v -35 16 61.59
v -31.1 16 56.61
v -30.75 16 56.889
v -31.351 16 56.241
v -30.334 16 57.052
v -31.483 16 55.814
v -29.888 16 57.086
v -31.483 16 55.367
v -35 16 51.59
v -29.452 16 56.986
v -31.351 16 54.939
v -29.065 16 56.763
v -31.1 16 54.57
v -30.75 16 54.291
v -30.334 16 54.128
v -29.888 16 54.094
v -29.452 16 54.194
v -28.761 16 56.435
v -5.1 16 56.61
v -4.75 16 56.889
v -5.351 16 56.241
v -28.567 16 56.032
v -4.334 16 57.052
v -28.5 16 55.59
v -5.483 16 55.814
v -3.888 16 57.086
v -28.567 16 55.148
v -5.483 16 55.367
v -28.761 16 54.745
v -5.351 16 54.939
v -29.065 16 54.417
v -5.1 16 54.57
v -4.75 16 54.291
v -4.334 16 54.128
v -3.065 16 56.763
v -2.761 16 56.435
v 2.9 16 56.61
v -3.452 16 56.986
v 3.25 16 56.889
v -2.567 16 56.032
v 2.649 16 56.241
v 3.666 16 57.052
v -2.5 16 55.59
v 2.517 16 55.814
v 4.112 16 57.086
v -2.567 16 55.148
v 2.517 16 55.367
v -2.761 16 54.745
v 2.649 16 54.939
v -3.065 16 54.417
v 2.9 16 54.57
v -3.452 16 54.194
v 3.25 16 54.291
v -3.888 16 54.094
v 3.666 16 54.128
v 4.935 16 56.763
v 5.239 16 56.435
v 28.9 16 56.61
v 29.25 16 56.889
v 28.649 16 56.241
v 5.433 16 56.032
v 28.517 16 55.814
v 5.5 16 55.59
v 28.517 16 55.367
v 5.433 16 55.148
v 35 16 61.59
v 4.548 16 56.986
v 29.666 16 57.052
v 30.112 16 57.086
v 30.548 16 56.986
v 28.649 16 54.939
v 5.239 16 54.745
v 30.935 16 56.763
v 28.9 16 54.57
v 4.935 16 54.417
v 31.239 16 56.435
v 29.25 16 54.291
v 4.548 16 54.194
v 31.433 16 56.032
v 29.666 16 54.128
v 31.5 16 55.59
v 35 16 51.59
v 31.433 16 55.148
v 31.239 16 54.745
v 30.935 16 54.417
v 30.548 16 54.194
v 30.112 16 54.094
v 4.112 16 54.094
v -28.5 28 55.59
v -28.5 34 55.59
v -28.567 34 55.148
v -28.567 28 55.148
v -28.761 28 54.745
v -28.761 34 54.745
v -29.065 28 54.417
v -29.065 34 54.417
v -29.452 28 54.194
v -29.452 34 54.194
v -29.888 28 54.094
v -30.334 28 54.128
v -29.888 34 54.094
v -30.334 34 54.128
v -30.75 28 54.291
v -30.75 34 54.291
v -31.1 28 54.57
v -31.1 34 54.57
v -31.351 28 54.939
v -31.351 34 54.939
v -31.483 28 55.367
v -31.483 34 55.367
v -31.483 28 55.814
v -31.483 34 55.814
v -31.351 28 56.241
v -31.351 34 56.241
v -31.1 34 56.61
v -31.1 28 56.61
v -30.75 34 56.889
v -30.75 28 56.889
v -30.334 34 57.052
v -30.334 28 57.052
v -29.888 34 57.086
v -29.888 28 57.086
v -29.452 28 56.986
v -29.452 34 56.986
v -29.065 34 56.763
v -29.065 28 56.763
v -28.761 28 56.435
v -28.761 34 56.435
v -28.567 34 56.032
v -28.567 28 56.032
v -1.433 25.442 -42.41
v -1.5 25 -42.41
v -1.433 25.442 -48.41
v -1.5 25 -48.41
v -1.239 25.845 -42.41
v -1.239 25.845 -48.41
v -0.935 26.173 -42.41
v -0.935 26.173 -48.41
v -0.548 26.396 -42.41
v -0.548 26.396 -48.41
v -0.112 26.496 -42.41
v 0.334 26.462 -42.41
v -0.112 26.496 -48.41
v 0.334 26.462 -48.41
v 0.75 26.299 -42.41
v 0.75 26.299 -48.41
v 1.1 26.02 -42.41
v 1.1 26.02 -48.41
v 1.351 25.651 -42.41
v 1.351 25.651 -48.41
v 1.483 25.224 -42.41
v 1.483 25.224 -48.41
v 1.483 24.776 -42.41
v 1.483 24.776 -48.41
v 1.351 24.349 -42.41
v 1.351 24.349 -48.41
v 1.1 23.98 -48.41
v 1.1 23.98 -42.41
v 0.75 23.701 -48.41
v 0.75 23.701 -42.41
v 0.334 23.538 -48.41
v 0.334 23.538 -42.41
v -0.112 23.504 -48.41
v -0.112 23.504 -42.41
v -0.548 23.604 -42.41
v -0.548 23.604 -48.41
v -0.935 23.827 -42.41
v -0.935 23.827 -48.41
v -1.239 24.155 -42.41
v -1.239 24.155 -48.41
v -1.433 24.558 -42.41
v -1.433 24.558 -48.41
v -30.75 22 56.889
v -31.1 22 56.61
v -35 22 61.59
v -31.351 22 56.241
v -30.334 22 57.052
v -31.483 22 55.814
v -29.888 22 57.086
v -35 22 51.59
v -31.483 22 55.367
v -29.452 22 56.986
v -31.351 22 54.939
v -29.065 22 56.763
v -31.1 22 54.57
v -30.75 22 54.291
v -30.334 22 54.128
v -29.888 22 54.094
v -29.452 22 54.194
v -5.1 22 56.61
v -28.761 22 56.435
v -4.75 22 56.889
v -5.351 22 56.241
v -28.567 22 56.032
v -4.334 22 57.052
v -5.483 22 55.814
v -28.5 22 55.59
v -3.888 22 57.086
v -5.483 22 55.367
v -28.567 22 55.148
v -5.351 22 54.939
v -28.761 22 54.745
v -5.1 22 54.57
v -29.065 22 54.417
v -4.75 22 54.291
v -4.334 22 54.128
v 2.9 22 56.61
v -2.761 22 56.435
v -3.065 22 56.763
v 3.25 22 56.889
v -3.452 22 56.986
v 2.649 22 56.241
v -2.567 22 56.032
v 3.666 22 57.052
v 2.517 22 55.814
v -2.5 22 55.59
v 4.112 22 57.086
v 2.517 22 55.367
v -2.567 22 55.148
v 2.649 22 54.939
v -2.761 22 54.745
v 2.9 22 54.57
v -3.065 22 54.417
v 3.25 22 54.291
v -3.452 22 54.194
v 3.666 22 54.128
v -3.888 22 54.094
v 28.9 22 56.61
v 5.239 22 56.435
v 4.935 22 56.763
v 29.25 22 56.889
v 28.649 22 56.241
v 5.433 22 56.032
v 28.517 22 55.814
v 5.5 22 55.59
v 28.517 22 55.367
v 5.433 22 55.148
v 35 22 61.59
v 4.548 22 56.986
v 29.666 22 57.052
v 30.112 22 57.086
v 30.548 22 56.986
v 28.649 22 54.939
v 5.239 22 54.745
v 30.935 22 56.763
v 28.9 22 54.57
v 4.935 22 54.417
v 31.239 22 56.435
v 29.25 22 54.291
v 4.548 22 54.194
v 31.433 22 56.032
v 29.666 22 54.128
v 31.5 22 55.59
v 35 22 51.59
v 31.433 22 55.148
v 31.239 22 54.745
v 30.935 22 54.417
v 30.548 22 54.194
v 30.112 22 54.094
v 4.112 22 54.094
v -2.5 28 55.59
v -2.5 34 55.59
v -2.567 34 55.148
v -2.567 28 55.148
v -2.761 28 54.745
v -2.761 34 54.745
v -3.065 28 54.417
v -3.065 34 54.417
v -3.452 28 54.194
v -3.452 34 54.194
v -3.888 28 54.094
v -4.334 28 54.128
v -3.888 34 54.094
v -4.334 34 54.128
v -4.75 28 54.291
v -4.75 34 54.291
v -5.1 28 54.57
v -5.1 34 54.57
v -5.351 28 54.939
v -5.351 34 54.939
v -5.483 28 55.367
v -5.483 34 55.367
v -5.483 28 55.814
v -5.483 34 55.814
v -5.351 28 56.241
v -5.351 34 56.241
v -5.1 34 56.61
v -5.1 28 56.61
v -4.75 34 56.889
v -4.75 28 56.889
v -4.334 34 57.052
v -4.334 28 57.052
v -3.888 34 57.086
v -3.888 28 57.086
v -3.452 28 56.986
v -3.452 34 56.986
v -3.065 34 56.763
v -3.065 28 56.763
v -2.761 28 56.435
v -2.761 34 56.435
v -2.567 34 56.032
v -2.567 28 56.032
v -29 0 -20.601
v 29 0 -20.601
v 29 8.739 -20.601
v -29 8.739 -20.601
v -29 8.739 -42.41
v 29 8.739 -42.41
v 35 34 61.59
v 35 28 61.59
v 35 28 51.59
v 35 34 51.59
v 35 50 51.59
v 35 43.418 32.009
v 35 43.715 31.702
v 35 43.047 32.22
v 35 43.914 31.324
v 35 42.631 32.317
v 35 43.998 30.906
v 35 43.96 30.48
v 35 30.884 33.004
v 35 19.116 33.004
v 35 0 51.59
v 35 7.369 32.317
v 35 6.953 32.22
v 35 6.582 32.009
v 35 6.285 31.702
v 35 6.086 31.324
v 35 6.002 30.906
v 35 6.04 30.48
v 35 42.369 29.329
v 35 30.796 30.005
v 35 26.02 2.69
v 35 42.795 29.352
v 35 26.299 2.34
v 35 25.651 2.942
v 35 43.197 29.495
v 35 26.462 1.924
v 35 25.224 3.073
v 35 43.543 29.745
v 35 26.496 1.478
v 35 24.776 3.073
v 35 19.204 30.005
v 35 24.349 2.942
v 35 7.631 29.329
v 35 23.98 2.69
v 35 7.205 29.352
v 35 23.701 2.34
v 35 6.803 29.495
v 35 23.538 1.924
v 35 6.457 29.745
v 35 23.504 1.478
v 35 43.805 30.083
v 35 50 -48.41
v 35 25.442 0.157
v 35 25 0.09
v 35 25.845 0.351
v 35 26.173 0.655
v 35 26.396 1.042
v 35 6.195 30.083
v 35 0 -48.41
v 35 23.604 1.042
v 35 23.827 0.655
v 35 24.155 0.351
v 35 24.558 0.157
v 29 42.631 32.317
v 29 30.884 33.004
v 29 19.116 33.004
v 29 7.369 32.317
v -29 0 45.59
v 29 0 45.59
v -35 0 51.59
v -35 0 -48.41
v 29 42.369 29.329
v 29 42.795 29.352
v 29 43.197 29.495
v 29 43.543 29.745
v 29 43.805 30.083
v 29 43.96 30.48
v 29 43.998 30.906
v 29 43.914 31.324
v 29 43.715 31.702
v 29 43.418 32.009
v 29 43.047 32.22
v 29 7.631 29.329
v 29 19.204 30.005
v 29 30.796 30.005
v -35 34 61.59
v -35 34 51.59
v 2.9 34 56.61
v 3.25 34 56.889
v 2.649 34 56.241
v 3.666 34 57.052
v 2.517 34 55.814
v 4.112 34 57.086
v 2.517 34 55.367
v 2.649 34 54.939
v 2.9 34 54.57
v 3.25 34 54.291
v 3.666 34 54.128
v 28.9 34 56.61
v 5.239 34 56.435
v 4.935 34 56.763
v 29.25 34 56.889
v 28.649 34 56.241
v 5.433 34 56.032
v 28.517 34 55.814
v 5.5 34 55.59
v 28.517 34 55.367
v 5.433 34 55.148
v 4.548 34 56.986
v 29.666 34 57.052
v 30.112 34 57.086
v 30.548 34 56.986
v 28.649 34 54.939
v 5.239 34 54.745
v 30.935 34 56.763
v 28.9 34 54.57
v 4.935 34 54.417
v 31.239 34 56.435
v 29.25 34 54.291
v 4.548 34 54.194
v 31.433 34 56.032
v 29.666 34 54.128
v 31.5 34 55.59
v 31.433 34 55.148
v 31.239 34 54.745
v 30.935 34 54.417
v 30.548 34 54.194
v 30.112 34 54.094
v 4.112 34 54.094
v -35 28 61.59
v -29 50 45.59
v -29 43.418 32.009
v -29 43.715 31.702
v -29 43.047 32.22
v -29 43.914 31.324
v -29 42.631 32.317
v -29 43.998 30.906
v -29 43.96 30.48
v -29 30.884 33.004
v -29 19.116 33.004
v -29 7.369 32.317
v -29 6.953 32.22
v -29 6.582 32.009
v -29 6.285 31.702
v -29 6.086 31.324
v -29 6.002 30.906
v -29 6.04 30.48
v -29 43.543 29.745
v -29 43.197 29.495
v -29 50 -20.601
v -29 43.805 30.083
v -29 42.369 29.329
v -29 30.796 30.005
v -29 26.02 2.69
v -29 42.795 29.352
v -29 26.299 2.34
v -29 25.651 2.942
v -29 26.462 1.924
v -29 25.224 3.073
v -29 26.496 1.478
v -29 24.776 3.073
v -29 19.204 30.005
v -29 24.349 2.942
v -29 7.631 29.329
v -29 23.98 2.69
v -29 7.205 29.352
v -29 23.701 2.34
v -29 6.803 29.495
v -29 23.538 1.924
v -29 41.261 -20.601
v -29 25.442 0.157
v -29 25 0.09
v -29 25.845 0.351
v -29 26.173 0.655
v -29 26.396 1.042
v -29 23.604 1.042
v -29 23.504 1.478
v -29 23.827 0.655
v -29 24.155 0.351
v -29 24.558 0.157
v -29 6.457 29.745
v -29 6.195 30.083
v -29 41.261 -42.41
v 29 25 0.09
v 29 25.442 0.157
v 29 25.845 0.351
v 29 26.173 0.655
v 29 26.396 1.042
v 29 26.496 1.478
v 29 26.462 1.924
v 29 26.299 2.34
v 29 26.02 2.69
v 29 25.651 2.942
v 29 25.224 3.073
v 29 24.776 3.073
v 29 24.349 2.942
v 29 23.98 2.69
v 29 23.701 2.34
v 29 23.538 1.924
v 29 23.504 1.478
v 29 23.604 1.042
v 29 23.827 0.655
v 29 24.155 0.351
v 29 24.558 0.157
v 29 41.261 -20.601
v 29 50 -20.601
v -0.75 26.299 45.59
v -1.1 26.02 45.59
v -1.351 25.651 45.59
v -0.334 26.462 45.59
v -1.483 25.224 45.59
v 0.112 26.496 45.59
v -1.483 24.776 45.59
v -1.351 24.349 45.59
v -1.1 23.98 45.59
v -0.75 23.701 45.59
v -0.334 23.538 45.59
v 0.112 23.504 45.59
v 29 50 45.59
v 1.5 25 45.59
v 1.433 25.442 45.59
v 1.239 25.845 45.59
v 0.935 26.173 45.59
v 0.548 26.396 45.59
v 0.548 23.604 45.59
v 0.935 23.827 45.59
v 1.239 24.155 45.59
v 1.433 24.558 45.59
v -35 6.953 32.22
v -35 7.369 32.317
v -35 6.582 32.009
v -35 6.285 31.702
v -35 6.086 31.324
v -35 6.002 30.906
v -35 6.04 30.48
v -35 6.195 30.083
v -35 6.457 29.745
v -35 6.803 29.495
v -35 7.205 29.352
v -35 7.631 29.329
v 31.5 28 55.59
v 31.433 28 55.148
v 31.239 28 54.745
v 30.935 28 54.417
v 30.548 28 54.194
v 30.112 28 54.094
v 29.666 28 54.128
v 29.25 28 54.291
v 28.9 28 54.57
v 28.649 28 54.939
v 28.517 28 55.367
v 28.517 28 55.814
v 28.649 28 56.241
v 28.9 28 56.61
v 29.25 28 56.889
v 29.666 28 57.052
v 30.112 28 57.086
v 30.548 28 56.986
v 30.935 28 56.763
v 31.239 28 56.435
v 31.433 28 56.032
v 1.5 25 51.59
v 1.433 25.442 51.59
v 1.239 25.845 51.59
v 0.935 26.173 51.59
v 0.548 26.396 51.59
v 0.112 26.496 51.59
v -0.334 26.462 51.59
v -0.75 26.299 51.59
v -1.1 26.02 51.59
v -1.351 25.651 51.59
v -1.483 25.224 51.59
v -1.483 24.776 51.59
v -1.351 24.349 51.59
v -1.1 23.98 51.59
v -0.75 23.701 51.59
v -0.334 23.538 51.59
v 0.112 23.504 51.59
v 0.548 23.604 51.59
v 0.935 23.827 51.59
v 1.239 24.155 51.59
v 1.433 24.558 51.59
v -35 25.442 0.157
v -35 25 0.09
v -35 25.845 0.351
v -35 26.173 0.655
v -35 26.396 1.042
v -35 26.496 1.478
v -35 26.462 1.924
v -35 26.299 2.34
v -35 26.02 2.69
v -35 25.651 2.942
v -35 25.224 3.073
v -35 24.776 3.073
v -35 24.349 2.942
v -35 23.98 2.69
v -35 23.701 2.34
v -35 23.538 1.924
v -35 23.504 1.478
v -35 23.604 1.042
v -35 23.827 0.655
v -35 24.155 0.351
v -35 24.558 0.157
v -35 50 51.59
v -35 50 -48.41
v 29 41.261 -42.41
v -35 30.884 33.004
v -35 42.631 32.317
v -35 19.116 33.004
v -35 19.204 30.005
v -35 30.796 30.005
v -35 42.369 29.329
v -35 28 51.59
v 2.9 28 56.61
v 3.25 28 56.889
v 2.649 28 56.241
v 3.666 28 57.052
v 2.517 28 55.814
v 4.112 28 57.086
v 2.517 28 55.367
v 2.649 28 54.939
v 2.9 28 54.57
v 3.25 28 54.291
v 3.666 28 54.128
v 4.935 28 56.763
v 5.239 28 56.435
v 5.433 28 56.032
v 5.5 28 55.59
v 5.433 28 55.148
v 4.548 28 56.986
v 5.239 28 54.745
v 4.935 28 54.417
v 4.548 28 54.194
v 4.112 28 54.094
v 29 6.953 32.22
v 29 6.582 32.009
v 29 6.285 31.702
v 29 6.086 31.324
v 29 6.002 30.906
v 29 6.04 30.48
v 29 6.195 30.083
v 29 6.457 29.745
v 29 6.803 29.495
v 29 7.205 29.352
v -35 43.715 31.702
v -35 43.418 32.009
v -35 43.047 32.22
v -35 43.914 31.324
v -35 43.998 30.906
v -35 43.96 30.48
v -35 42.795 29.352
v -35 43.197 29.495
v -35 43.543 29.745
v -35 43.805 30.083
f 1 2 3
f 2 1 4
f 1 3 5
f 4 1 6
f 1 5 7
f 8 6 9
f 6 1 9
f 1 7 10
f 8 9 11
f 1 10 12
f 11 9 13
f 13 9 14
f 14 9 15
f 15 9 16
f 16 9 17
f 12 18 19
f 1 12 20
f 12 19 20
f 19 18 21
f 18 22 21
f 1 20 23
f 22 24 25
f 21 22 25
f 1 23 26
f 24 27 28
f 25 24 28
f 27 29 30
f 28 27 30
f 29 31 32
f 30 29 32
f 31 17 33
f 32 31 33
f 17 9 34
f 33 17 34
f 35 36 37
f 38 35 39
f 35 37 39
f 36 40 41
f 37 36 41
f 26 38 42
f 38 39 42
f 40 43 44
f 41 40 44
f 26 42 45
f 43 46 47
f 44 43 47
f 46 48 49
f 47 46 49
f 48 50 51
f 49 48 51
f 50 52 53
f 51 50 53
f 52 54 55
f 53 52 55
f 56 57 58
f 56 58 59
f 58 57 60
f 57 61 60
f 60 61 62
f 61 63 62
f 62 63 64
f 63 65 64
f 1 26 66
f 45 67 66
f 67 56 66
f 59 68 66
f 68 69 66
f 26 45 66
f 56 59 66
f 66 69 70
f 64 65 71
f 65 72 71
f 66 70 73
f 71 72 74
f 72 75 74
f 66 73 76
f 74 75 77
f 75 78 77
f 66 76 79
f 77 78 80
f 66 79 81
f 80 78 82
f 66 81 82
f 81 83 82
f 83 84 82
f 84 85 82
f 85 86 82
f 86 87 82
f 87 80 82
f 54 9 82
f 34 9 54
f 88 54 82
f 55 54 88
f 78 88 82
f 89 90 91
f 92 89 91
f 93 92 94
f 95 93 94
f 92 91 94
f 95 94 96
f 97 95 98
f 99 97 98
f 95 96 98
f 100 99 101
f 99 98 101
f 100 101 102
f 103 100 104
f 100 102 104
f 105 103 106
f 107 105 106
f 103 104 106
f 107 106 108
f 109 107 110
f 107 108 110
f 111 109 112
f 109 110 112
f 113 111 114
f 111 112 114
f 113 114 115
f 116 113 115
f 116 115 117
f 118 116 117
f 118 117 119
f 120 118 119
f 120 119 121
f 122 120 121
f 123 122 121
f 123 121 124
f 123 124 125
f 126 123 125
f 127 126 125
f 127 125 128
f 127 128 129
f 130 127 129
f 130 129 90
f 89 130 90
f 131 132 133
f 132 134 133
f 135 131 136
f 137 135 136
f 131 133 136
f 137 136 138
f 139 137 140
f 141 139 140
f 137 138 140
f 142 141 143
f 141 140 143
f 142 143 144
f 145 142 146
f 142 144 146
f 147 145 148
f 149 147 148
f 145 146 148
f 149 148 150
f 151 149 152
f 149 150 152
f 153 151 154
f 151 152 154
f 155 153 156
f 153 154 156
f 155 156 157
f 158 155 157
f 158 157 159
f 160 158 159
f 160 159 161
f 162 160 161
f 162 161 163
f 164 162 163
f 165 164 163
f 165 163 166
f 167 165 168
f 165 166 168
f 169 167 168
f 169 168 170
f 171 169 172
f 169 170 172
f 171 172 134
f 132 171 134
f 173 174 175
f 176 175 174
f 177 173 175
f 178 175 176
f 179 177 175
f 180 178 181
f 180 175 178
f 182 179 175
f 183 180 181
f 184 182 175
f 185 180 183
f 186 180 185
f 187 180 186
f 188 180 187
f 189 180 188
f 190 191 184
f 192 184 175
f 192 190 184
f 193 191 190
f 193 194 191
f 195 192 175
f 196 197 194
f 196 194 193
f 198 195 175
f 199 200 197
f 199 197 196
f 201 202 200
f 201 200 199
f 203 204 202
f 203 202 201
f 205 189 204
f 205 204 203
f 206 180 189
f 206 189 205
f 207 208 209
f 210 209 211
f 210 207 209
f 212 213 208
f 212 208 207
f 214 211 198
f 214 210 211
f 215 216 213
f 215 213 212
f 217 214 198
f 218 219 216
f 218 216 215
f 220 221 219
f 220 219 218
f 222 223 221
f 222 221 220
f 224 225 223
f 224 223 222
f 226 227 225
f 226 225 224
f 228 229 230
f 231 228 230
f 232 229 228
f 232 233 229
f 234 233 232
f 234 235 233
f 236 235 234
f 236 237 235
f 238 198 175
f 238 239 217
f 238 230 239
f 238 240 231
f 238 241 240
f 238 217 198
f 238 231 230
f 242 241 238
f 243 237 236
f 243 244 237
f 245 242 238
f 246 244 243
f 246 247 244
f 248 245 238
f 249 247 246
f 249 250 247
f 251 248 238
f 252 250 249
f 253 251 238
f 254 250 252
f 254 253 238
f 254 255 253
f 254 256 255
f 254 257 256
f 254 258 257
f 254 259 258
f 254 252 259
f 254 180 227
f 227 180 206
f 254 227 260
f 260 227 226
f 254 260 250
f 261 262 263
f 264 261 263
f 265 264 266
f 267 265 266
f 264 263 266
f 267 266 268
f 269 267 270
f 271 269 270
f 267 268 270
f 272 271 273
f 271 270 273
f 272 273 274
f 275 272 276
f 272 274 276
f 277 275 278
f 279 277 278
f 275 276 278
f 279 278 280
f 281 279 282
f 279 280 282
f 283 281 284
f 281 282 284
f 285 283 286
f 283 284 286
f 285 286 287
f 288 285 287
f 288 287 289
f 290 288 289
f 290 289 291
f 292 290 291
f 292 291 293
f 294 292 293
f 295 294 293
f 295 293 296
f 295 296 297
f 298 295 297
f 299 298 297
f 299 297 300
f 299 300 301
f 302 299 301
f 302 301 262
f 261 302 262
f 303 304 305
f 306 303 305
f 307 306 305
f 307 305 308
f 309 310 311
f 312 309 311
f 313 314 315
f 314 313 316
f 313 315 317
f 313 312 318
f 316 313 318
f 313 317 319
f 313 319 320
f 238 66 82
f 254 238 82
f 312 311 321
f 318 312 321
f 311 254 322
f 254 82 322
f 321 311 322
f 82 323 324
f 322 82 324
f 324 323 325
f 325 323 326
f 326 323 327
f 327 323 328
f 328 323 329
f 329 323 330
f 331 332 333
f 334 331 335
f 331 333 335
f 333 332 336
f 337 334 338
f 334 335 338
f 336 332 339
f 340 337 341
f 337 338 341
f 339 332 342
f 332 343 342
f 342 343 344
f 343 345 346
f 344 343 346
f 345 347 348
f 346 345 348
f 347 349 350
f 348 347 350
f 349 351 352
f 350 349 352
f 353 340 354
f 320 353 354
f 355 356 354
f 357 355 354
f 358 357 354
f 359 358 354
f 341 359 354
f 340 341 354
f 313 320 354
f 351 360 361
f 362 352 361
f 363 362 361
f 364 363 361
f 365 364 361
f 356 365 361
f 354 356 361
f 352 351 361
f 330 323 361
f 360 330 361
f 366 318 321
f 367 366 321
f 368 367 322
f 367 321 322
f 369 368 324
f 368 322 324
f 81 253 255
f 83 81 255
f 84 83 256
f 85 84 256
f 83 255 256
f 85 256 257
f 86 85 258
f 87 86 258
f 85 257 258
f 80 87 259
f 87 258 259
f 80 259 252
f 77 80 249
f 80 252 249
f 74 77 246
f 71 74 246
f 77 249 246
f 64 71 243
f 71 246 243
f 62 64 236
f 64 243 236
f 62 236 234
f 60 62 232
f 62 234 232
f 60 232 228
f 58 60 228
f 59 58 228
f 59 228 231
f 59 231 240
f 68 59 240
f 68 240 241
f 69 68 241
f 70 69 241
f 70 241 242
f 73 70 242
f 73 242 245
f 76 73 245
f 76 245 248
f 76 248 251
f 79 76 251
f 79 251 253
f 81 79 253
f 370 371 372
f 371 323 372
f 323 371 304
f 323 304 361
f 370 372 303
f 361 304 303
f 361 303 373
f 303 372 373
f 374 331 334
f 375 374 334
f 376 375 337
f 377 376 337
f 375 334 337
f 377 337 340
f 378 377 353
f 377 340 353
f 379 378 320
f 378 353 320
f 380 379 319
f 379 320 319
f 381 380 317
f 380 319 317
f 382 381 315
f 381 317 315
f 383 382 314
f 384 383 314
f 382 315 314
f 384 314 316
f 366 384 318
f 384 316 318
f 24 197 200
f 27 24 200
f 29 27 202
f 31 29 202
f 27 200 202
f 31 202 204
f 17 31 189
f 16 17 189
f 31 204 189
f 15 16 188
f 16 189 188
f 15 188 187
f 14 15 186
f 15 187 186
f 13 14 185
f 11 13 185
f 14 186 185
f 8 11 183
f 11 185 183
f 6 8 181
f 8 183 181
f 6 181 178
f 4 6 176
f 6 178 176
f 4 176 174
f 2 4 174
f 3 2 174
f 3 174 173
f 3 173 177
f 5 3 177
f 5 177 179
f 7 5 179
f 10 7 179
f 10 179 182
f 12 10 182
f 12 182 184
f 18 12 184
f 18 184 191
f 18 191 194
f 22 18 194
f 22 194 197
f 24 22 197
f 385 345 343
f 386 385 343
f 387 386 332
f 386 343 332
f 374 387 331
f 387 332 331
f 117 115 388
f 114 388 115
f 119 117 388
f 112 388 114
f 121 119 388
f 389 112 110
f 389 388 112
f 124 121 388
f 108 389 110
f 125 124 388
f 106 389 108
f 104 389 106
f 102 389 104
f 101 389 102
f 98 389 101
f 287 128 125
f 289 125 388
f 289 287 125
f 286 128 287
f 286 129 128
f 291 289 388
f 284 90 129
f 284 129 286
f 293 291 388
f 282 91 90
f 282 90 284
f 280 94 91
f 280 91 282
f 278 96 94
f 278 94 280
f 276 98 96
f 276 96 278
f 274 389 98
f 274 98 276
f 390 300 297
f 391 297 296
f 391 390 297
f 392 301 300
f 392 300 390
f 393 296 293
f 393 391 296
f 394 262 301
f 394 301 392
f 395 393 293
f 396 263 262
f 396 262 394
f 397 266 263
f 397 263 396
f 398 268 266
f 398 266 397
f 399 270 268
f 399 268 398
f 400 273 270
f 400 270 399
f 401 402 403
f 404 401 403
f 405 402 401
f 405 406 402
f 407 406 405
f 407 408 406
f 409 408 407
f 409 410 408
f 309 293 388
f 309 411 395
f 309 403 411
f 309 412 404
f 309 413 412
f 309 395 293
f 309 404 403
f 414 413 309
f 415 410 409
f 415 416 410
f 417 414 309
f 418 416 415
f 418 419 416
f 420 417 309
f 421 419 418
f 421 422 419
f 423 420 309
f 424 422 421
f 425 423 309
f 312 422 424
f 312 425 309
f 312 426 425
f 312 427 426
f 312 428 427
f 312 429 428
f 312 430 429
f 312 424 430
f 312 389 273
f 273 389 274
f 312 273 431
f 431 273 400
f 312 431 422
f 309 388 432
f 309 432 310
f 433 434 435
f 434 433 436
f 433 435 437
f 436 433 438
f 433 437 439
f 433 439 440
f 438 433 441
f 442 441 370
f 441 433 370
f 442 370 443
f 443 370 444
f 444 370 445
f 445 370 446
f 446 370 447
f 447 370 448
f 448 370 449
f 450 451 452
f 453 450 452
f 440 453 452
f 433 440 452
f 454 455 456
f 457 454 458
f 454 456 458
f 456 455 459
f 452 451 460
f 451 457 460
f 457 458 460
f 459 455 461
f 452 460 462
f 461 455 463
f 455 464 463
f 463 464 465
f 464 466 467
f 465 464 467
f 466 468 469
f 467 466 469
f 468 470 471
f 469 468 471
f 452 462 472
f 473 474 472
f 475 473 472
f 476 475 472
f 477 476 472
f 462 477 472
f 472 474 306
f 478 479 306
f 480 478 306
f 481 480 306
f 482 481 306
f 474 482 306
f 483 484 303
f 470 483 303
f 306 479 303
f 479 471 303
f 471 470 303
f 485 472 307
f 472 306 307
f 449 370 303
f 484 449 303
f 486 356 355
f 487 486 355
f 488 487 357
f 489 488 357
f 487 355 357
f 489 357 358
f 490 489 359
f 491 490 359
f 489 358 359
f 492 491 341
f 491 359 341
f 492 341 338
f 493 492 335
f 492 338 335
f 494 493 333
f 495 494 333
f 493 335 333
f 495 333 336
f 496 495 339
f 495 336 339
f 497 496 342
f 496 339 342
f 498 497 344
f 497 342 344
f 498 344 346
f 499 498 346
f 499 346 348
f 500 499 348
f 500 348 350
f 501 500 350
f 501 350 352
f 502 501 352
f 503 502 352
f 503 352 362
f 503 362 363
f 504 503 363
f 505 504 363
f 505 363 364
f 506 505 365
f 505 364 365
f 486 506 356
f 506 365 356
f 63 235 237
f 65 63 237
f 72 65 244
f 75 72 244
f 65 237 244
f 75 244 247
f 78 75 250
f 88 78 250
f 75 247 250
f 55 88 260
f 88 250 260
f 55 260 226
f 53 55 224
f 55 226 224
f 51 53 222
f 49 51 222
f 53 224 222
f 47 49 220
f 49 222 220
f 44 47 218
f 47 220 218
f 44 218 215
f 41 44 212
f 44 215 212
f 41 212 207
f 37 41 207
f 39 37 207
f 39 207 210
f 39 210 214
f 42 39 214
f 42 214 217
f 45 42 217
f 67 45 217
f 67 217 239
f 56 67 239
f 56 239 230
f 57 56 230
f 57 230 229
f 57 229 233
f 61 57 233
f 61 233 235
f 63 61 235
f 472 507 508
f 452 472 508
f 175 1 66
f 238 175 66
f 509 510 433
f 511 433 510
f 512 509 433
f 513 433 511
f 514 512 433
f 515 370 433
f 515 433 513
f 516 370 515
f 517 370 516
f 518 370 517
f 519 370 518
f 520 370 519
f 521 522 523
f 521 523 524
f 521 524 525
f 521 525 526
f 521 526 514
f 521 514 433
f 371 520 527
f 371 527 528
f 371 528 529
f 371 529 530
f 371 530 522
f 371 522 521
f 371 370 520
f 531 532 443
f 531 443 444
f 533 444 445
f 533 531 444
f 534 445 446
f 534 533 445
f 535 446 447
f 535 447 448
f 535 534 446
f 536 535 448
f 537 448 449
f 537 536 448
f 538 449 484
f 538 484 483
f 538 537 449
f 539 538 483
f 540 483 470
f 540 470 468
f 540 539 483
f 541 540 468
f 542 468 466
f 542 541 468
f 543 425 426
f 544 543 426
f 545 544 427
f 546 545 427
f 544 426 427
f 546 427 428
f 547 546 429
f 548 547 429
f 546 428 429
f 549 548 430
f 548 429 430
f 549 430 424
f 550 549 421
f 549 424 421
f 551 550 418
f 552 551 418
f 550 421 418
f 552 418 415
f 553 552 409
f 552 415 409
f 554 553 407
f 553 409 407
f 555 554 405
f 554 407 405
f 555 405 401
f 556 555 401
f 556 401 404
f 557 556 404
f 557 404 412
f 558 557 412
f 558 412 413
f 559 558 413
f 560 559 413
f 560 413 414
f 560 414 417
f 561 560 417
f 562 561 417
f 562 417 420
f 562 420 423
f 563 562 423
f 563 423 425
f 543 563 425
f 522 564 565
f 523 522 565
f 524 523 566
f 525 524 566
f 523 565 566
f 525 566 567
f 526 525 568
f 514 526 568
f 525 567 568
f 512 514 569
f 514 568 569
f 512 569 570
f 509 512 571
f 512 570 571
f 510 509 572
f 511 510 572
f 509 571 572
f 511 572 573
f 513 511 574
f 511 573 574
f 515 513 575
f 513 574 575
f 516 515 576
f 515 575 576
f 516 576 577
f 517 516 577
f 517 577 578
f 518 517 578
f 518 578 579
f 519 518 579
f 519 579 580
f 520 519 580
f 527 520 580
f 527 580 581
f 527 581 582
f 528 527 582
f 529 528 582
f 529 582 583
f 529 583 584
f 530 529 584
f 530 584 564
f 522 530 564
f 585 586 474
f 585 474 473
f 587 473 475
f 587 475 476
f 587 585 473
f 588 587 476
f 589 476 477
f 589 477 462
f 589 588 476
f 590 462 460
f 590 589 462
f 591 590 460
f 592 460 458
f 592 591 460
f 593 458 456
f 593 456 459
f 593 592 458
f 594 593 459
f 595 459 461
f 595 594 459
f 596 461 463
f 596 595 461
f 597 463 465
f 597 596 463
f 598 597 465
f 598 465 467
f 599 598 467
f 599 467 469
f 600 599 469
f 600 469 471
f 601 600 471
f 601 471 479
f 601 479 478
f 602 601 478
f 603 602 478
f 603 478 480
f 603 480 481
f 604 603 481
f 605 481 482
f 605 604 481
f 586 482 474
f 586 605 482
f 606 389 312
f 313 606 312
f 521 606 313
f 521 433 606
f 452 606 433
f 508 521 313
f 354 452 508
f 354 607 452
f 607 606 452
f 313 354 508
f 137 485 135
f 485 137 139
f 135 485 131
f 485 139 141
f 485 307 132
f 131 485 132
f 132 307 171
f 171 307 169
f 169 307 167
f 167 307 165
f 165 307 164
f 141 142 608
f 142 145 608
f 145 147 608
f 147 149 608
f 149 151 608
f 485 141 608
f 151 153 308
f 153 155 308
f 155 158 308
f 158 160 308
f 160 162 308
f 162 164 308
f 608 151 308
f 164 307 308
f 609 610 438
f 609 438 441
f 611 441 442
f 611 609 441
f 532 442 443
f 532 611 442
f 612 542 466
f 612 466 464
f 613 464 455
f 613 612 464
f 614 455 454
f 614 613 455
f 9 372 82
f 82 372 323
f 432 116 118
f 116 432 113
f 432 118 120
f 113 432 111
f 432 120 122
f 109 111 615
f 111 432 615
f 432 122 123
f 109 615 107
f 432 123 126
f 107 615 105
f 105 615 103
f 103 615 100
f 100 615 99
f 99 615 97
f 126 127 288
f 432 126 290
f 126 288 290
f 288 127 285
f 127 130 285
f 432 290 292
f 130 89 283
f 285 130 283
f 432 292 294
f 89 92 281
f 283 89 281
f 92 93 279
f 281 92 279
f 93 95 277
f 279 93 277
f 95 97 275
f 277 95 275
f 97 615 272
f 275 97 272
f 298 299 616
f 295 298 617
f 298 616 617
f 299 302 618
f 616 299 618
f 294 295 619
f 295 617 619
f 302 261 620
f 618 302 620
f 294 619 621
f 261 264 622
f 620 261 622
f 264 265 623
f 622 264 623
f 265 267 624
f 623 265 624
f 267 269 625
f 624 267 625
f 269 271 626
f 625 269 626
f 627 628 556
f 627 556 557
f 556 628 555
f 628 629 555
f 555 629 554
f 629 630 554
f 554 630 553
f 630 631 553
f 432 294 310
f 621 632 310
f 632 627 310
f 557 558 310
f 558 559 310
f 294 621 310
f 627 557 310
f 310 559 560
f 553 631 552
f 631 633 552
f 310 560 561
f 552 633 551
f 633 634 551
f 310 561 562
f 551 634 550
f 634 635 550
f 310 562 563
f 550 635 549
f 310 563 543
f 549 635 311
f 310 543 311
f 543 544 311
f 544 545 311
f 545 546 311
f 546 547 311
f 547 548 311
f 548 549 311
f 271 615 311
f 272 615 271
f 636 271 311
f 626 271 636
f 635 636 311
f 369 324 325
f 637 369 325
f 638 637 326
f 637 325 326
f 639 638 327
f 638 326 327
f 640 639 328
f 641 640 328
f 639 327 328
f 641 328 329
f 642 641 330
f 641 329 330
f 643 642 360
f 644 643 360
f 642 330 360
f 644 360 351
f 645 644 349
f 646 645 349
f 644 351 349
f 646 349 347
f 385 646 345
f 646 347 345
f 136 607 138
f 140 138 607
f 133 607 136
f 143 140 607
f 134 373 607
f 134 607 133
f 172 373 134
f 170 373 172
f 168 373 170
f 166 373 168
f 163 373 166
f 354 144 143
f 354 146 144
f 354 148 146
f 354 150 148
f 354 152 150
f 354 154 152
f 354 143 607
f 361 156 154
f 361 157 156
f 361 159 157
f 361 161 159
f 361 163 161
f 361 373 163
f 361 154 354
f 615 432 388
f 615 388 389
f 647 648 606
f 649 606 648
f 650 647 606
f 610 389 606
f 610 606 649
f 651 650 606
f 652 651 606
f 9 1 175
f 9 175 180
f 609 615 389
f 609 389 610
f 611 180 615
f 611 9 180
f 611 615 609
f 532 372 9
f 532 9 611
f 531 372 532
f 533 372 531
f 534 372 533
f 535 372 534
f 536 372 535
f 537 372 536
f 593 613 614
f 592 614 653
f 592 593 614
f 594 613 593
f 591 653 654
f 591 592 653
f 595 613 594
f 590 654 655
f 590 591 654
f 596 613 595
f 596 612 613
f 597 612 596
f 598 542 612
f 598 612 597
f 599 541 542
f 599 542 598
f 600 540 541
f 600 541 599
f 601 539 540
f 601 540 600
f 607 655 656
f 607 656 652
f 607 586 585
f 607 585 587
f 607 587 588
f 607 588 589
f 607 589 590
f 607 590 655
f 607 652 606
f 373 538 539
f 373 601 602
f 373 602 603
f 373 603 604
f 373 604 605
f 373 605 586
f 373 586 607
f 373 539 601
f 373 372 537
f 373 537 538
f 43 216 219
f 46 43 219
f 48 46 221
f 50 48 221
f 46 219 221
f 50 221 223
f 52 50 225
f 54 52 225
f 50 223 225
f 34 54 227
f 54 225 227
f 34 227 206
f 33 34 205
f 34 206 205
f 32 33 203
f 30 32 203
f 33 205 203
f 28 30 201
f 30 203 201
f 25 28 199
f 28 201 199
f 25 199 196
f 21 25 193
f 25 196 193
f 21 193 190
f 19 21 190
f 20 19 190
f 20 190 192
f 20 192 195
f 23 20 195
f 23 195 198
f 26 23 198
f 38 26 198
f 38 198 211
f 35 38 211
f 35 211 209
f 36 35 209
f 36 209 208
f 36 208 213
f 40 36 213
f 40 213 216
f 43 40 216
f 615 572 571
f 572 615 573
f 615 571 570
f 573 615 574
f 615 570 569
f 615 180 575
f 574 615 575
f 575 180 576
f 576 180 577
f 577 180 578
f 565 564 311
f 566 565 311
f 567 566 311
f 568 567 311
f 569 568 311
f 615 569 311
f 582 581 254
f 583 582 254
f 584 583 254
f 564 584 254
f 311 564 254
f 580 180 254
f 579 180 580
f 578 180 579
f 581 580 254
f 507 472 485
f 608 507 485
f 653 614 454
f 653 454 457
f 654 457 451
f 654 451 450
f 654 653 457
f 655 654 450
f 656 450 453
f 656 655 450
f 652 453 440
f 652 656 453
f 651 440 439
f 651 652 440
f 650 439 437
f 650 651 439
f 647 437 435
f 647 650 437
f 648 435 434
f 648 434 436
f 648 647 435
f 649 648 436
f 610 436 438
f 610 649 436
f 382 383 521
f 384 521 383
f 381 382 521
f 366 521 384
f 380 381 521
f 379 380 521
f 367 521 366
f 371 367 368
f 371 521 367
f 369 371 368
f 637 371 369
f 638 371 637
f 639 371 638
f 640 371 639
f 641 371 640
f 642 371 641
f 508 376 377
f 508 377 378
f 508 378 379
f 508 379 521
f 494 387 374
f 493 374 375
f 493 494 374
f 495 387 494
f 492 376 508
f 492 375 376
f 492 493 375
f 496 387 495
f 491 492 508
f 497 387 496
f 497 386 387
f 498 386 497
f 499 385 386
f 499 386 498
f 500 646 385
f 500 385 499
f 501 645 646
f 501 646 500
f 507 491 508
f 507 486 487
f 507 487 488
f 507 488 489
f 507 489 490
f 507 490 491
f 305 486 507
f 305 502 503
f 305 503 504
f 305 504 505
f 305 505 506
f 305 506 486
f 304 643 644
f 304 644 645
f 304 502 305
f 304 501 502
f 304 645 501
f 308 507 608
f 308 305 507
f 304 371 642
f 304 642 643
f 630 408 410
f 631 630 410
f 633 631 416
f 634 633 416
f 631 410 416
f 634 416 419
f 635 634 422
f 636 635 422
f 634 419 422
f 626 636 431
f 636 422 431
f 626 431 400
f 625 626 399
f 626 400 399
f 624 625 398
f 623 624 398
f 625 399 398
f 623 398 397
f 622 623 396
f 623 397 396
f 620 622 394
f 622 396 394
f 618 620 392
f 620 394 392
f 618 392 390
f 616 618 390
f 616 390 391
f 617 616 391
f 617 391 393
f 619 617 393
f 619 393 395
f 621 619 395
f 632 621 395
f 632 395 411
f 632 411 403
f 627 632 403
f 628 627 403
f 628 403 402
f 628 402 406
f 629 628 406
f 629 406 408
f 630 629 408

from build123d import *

# Parameters (mm, degrees)
SKETCH1_W                        = 70
SKETCH1_H                        = 100
SKETCH1_W_2                      = 58
SKETCH1_H_2                      = 88
MAIN_BODY_DEPTH                  = 50
BACK_WIRE_HOLE_REACH             = 102
SKETCH3_R                        = 1.5
FRONT_WIRE_HOLE_REACH            = 102
SKETCH6_R                        = 1.5
SKETCH4_W                        = 70
SKETCH4_H                        = 6
BACK_LIP_DEPTH                   = 10
SKETCH5_R                        = 1.5
BACK_LIP_HOLES_DEPTH             = 35
SKETCH2_R                        = 1.5
GEARED_ARM_HOLE_DEPTH            = 6
SKETCH10_W                       = 23
SKETCH10_H                       = 8.7393957
SERVO_MOUNT_MAIN_EXTRUSION_DEPTH = 58
WING_CONNECTION_SLOT_DEPTH       = 6


with BuildPart() as part:
    # Sketch1 → main_body (new body)
    with BuildSketch(Plane(origin=(0, 0, 0), x_dir=(1, 0, 0), z_dir=(0, 1, 0))):
        with Locations((0, -1.59009009)):
            Rectangle(SKETCH1_W, SKETCH1_H)
        with Locations((0, -1.59009009)):
            Rectangle(SKETCH1_W_2, SKETCH1_H_2, mode=Mode.SUBTRACT)
    extrude(amount=MAIN_BODY_DEPTH)

    # Sketch3 → back_wire_hole (cut, up to next)
    with BuildSketch(Plane.XY.offset(51.59009009), mode=Mode.PRIVATE) as back_wire_hole_sk1:
        with Locations((0, 25)):
            Circle(SKETCH3_R)
    back_wire_hole_tool1 = extrude(back_wire_hole_sk1.sketch, amount=-BACK_WIRE_HOLE_REACH, mode=Mode.PRIVATE) & part.part
    add(back_wire_hole_tool1.solids().sort_by_distance((0, 25, 51.59009))[0], mode=Mode.SUBTRACT)

    # Sketch6 → front_wire_hole (cut, up to next)
    with BuildSketch(Plane(origin=(0, 0, -48.40990991), x_dir=(-1, 0, 0), z_dir=(0, 0, -1)), mode=Mode.PRIVATE) as front_wire_hole_sk1:
        with Locations((0, 25)):
            Circle(SKETCH6_R)
    front_wire_hole_tool1 = extrude(front_wire_hole_sk1.sketch, amount=-FRONT_WIRE_HOLE_REACH, mode=Mode.PRIVATE) & part.part
    add(front_wire_hole_tool1.solids().sort_by_distance((0, 25, -48.40991))[0], mode=Mode.SUBTRACT)

    # Sketch4 → back_lip (add)
    with BuildSketch(Plane.XY.offset(51.59009009)):
        with Locations((0, 31)):
            Rectangle(SKETCH4_W, SKETCH4_H)
    back_lip = extrude(amount=BACK_LIP_DEPTH)

    # back_lip_mirror: back_lip across plane
    add(back_lip.mirror(Plane.ZX.offset(25)))

    # Sketch5 → back_lip_holes (cut, through all)
    with BuildSketch(Plane(origin=(0, 34, 0), x_dir=(1, 0, 0), z_dir=(0, 1, 0))):
        with Locations((4, -55.59009009)):
            Circle(SKETCH5_R)
        with Locations((30, -55.59009009)):
            Circle(SKETCH5_R)
        with Locations((-30, -55.59009009)):
            Circle(SKETCH5_R)
        with Locations((-4, -55.59009009)):
            Circle(SKETCH5_R)
    extrude(amount=-BACK_LIP_HOLES_DEPTH, mode=Mode.SUBTRACT)

    # Sketch2 → geared_arm_hole (cut)
    with BuildSketch(Plane(origin=(35, 0, 0), x_dir=(0, 0, -1), z_dir=(1, 0, 0))):
        with Locations((-1.59009009, 25)):
            Circle(SKETCH2_R)
    geared_arm_hole = extrude(amount=-GEARED_ARM_HOLE_DEPTH, mode=Mode.SUBTRACT)

    # geared_arm_hole_mirror: geared_arm_hole across plane
    add(geared_arm_hole.mirror(Plane(origin=(0, 0, 0), x_dir=(0, 0, 1), z_dir=(1, 0, 0))), mode=Mode.SUBTRACT)

    # Sketch10 → servo_mount_main_extrusion (add)
    with BuildSketch(Plane(origin=(-29, 0, 0), x_dir=(0, 0, -1), z_dir=(1, 0, 0))):
        with Locations((32.100688533, 4.36969785)):
            Rectangle(SKETCH10_W, SKETCH10_H)
        with Locations((32.100688533, 45.63030215)):
            Rectangle(SKETCH10_W, SKETCH10_H)
    extrude(amount=SERVO_MOUNT_MAIN_EXTRUSION_DEPTH)

    # Sketch11 → wing_connection_slot (cut)
    with BuildSketch(Plane(origin=(35, 0, 0), x_dir=(0, 0, -1), z_dir=(1, 0, 0))):
        with BuildLine():
            ThreePointArc((-32.317240778, 42.63125), (-33.09009009, 25), (-32.317240778, 7.36875))
            ThreePointArc((-32.317240778, 7.36875), (-30.691743999, 6.005753221), (-29.32874722, 7.63125))
            ThreePointArc((-29.32874722, 7.63125), (-30.09009009, 25), (-29.32874722, 42.36875))
            ThreePointArc((-29.32874722, 42.36875), (-30.691743999, 43.994246779), (-32.317240778, 42.63125))
        make_face()
    wing_connection_slot = extrude(amount=-WING_CONNECTION_SLOT_DEPTH, mode=Mode.SUBTRACT)

    # wing_connection_slot_mirror: wing_connection_slot across plane
    add(wing_connection_slot.mirror(Plane(origin=(0, 0, 0), x_dir=(0, 0, 1), z_dir=(1, 0, 0))), mode=Mode.SUBTRACT)


solid = part.part
